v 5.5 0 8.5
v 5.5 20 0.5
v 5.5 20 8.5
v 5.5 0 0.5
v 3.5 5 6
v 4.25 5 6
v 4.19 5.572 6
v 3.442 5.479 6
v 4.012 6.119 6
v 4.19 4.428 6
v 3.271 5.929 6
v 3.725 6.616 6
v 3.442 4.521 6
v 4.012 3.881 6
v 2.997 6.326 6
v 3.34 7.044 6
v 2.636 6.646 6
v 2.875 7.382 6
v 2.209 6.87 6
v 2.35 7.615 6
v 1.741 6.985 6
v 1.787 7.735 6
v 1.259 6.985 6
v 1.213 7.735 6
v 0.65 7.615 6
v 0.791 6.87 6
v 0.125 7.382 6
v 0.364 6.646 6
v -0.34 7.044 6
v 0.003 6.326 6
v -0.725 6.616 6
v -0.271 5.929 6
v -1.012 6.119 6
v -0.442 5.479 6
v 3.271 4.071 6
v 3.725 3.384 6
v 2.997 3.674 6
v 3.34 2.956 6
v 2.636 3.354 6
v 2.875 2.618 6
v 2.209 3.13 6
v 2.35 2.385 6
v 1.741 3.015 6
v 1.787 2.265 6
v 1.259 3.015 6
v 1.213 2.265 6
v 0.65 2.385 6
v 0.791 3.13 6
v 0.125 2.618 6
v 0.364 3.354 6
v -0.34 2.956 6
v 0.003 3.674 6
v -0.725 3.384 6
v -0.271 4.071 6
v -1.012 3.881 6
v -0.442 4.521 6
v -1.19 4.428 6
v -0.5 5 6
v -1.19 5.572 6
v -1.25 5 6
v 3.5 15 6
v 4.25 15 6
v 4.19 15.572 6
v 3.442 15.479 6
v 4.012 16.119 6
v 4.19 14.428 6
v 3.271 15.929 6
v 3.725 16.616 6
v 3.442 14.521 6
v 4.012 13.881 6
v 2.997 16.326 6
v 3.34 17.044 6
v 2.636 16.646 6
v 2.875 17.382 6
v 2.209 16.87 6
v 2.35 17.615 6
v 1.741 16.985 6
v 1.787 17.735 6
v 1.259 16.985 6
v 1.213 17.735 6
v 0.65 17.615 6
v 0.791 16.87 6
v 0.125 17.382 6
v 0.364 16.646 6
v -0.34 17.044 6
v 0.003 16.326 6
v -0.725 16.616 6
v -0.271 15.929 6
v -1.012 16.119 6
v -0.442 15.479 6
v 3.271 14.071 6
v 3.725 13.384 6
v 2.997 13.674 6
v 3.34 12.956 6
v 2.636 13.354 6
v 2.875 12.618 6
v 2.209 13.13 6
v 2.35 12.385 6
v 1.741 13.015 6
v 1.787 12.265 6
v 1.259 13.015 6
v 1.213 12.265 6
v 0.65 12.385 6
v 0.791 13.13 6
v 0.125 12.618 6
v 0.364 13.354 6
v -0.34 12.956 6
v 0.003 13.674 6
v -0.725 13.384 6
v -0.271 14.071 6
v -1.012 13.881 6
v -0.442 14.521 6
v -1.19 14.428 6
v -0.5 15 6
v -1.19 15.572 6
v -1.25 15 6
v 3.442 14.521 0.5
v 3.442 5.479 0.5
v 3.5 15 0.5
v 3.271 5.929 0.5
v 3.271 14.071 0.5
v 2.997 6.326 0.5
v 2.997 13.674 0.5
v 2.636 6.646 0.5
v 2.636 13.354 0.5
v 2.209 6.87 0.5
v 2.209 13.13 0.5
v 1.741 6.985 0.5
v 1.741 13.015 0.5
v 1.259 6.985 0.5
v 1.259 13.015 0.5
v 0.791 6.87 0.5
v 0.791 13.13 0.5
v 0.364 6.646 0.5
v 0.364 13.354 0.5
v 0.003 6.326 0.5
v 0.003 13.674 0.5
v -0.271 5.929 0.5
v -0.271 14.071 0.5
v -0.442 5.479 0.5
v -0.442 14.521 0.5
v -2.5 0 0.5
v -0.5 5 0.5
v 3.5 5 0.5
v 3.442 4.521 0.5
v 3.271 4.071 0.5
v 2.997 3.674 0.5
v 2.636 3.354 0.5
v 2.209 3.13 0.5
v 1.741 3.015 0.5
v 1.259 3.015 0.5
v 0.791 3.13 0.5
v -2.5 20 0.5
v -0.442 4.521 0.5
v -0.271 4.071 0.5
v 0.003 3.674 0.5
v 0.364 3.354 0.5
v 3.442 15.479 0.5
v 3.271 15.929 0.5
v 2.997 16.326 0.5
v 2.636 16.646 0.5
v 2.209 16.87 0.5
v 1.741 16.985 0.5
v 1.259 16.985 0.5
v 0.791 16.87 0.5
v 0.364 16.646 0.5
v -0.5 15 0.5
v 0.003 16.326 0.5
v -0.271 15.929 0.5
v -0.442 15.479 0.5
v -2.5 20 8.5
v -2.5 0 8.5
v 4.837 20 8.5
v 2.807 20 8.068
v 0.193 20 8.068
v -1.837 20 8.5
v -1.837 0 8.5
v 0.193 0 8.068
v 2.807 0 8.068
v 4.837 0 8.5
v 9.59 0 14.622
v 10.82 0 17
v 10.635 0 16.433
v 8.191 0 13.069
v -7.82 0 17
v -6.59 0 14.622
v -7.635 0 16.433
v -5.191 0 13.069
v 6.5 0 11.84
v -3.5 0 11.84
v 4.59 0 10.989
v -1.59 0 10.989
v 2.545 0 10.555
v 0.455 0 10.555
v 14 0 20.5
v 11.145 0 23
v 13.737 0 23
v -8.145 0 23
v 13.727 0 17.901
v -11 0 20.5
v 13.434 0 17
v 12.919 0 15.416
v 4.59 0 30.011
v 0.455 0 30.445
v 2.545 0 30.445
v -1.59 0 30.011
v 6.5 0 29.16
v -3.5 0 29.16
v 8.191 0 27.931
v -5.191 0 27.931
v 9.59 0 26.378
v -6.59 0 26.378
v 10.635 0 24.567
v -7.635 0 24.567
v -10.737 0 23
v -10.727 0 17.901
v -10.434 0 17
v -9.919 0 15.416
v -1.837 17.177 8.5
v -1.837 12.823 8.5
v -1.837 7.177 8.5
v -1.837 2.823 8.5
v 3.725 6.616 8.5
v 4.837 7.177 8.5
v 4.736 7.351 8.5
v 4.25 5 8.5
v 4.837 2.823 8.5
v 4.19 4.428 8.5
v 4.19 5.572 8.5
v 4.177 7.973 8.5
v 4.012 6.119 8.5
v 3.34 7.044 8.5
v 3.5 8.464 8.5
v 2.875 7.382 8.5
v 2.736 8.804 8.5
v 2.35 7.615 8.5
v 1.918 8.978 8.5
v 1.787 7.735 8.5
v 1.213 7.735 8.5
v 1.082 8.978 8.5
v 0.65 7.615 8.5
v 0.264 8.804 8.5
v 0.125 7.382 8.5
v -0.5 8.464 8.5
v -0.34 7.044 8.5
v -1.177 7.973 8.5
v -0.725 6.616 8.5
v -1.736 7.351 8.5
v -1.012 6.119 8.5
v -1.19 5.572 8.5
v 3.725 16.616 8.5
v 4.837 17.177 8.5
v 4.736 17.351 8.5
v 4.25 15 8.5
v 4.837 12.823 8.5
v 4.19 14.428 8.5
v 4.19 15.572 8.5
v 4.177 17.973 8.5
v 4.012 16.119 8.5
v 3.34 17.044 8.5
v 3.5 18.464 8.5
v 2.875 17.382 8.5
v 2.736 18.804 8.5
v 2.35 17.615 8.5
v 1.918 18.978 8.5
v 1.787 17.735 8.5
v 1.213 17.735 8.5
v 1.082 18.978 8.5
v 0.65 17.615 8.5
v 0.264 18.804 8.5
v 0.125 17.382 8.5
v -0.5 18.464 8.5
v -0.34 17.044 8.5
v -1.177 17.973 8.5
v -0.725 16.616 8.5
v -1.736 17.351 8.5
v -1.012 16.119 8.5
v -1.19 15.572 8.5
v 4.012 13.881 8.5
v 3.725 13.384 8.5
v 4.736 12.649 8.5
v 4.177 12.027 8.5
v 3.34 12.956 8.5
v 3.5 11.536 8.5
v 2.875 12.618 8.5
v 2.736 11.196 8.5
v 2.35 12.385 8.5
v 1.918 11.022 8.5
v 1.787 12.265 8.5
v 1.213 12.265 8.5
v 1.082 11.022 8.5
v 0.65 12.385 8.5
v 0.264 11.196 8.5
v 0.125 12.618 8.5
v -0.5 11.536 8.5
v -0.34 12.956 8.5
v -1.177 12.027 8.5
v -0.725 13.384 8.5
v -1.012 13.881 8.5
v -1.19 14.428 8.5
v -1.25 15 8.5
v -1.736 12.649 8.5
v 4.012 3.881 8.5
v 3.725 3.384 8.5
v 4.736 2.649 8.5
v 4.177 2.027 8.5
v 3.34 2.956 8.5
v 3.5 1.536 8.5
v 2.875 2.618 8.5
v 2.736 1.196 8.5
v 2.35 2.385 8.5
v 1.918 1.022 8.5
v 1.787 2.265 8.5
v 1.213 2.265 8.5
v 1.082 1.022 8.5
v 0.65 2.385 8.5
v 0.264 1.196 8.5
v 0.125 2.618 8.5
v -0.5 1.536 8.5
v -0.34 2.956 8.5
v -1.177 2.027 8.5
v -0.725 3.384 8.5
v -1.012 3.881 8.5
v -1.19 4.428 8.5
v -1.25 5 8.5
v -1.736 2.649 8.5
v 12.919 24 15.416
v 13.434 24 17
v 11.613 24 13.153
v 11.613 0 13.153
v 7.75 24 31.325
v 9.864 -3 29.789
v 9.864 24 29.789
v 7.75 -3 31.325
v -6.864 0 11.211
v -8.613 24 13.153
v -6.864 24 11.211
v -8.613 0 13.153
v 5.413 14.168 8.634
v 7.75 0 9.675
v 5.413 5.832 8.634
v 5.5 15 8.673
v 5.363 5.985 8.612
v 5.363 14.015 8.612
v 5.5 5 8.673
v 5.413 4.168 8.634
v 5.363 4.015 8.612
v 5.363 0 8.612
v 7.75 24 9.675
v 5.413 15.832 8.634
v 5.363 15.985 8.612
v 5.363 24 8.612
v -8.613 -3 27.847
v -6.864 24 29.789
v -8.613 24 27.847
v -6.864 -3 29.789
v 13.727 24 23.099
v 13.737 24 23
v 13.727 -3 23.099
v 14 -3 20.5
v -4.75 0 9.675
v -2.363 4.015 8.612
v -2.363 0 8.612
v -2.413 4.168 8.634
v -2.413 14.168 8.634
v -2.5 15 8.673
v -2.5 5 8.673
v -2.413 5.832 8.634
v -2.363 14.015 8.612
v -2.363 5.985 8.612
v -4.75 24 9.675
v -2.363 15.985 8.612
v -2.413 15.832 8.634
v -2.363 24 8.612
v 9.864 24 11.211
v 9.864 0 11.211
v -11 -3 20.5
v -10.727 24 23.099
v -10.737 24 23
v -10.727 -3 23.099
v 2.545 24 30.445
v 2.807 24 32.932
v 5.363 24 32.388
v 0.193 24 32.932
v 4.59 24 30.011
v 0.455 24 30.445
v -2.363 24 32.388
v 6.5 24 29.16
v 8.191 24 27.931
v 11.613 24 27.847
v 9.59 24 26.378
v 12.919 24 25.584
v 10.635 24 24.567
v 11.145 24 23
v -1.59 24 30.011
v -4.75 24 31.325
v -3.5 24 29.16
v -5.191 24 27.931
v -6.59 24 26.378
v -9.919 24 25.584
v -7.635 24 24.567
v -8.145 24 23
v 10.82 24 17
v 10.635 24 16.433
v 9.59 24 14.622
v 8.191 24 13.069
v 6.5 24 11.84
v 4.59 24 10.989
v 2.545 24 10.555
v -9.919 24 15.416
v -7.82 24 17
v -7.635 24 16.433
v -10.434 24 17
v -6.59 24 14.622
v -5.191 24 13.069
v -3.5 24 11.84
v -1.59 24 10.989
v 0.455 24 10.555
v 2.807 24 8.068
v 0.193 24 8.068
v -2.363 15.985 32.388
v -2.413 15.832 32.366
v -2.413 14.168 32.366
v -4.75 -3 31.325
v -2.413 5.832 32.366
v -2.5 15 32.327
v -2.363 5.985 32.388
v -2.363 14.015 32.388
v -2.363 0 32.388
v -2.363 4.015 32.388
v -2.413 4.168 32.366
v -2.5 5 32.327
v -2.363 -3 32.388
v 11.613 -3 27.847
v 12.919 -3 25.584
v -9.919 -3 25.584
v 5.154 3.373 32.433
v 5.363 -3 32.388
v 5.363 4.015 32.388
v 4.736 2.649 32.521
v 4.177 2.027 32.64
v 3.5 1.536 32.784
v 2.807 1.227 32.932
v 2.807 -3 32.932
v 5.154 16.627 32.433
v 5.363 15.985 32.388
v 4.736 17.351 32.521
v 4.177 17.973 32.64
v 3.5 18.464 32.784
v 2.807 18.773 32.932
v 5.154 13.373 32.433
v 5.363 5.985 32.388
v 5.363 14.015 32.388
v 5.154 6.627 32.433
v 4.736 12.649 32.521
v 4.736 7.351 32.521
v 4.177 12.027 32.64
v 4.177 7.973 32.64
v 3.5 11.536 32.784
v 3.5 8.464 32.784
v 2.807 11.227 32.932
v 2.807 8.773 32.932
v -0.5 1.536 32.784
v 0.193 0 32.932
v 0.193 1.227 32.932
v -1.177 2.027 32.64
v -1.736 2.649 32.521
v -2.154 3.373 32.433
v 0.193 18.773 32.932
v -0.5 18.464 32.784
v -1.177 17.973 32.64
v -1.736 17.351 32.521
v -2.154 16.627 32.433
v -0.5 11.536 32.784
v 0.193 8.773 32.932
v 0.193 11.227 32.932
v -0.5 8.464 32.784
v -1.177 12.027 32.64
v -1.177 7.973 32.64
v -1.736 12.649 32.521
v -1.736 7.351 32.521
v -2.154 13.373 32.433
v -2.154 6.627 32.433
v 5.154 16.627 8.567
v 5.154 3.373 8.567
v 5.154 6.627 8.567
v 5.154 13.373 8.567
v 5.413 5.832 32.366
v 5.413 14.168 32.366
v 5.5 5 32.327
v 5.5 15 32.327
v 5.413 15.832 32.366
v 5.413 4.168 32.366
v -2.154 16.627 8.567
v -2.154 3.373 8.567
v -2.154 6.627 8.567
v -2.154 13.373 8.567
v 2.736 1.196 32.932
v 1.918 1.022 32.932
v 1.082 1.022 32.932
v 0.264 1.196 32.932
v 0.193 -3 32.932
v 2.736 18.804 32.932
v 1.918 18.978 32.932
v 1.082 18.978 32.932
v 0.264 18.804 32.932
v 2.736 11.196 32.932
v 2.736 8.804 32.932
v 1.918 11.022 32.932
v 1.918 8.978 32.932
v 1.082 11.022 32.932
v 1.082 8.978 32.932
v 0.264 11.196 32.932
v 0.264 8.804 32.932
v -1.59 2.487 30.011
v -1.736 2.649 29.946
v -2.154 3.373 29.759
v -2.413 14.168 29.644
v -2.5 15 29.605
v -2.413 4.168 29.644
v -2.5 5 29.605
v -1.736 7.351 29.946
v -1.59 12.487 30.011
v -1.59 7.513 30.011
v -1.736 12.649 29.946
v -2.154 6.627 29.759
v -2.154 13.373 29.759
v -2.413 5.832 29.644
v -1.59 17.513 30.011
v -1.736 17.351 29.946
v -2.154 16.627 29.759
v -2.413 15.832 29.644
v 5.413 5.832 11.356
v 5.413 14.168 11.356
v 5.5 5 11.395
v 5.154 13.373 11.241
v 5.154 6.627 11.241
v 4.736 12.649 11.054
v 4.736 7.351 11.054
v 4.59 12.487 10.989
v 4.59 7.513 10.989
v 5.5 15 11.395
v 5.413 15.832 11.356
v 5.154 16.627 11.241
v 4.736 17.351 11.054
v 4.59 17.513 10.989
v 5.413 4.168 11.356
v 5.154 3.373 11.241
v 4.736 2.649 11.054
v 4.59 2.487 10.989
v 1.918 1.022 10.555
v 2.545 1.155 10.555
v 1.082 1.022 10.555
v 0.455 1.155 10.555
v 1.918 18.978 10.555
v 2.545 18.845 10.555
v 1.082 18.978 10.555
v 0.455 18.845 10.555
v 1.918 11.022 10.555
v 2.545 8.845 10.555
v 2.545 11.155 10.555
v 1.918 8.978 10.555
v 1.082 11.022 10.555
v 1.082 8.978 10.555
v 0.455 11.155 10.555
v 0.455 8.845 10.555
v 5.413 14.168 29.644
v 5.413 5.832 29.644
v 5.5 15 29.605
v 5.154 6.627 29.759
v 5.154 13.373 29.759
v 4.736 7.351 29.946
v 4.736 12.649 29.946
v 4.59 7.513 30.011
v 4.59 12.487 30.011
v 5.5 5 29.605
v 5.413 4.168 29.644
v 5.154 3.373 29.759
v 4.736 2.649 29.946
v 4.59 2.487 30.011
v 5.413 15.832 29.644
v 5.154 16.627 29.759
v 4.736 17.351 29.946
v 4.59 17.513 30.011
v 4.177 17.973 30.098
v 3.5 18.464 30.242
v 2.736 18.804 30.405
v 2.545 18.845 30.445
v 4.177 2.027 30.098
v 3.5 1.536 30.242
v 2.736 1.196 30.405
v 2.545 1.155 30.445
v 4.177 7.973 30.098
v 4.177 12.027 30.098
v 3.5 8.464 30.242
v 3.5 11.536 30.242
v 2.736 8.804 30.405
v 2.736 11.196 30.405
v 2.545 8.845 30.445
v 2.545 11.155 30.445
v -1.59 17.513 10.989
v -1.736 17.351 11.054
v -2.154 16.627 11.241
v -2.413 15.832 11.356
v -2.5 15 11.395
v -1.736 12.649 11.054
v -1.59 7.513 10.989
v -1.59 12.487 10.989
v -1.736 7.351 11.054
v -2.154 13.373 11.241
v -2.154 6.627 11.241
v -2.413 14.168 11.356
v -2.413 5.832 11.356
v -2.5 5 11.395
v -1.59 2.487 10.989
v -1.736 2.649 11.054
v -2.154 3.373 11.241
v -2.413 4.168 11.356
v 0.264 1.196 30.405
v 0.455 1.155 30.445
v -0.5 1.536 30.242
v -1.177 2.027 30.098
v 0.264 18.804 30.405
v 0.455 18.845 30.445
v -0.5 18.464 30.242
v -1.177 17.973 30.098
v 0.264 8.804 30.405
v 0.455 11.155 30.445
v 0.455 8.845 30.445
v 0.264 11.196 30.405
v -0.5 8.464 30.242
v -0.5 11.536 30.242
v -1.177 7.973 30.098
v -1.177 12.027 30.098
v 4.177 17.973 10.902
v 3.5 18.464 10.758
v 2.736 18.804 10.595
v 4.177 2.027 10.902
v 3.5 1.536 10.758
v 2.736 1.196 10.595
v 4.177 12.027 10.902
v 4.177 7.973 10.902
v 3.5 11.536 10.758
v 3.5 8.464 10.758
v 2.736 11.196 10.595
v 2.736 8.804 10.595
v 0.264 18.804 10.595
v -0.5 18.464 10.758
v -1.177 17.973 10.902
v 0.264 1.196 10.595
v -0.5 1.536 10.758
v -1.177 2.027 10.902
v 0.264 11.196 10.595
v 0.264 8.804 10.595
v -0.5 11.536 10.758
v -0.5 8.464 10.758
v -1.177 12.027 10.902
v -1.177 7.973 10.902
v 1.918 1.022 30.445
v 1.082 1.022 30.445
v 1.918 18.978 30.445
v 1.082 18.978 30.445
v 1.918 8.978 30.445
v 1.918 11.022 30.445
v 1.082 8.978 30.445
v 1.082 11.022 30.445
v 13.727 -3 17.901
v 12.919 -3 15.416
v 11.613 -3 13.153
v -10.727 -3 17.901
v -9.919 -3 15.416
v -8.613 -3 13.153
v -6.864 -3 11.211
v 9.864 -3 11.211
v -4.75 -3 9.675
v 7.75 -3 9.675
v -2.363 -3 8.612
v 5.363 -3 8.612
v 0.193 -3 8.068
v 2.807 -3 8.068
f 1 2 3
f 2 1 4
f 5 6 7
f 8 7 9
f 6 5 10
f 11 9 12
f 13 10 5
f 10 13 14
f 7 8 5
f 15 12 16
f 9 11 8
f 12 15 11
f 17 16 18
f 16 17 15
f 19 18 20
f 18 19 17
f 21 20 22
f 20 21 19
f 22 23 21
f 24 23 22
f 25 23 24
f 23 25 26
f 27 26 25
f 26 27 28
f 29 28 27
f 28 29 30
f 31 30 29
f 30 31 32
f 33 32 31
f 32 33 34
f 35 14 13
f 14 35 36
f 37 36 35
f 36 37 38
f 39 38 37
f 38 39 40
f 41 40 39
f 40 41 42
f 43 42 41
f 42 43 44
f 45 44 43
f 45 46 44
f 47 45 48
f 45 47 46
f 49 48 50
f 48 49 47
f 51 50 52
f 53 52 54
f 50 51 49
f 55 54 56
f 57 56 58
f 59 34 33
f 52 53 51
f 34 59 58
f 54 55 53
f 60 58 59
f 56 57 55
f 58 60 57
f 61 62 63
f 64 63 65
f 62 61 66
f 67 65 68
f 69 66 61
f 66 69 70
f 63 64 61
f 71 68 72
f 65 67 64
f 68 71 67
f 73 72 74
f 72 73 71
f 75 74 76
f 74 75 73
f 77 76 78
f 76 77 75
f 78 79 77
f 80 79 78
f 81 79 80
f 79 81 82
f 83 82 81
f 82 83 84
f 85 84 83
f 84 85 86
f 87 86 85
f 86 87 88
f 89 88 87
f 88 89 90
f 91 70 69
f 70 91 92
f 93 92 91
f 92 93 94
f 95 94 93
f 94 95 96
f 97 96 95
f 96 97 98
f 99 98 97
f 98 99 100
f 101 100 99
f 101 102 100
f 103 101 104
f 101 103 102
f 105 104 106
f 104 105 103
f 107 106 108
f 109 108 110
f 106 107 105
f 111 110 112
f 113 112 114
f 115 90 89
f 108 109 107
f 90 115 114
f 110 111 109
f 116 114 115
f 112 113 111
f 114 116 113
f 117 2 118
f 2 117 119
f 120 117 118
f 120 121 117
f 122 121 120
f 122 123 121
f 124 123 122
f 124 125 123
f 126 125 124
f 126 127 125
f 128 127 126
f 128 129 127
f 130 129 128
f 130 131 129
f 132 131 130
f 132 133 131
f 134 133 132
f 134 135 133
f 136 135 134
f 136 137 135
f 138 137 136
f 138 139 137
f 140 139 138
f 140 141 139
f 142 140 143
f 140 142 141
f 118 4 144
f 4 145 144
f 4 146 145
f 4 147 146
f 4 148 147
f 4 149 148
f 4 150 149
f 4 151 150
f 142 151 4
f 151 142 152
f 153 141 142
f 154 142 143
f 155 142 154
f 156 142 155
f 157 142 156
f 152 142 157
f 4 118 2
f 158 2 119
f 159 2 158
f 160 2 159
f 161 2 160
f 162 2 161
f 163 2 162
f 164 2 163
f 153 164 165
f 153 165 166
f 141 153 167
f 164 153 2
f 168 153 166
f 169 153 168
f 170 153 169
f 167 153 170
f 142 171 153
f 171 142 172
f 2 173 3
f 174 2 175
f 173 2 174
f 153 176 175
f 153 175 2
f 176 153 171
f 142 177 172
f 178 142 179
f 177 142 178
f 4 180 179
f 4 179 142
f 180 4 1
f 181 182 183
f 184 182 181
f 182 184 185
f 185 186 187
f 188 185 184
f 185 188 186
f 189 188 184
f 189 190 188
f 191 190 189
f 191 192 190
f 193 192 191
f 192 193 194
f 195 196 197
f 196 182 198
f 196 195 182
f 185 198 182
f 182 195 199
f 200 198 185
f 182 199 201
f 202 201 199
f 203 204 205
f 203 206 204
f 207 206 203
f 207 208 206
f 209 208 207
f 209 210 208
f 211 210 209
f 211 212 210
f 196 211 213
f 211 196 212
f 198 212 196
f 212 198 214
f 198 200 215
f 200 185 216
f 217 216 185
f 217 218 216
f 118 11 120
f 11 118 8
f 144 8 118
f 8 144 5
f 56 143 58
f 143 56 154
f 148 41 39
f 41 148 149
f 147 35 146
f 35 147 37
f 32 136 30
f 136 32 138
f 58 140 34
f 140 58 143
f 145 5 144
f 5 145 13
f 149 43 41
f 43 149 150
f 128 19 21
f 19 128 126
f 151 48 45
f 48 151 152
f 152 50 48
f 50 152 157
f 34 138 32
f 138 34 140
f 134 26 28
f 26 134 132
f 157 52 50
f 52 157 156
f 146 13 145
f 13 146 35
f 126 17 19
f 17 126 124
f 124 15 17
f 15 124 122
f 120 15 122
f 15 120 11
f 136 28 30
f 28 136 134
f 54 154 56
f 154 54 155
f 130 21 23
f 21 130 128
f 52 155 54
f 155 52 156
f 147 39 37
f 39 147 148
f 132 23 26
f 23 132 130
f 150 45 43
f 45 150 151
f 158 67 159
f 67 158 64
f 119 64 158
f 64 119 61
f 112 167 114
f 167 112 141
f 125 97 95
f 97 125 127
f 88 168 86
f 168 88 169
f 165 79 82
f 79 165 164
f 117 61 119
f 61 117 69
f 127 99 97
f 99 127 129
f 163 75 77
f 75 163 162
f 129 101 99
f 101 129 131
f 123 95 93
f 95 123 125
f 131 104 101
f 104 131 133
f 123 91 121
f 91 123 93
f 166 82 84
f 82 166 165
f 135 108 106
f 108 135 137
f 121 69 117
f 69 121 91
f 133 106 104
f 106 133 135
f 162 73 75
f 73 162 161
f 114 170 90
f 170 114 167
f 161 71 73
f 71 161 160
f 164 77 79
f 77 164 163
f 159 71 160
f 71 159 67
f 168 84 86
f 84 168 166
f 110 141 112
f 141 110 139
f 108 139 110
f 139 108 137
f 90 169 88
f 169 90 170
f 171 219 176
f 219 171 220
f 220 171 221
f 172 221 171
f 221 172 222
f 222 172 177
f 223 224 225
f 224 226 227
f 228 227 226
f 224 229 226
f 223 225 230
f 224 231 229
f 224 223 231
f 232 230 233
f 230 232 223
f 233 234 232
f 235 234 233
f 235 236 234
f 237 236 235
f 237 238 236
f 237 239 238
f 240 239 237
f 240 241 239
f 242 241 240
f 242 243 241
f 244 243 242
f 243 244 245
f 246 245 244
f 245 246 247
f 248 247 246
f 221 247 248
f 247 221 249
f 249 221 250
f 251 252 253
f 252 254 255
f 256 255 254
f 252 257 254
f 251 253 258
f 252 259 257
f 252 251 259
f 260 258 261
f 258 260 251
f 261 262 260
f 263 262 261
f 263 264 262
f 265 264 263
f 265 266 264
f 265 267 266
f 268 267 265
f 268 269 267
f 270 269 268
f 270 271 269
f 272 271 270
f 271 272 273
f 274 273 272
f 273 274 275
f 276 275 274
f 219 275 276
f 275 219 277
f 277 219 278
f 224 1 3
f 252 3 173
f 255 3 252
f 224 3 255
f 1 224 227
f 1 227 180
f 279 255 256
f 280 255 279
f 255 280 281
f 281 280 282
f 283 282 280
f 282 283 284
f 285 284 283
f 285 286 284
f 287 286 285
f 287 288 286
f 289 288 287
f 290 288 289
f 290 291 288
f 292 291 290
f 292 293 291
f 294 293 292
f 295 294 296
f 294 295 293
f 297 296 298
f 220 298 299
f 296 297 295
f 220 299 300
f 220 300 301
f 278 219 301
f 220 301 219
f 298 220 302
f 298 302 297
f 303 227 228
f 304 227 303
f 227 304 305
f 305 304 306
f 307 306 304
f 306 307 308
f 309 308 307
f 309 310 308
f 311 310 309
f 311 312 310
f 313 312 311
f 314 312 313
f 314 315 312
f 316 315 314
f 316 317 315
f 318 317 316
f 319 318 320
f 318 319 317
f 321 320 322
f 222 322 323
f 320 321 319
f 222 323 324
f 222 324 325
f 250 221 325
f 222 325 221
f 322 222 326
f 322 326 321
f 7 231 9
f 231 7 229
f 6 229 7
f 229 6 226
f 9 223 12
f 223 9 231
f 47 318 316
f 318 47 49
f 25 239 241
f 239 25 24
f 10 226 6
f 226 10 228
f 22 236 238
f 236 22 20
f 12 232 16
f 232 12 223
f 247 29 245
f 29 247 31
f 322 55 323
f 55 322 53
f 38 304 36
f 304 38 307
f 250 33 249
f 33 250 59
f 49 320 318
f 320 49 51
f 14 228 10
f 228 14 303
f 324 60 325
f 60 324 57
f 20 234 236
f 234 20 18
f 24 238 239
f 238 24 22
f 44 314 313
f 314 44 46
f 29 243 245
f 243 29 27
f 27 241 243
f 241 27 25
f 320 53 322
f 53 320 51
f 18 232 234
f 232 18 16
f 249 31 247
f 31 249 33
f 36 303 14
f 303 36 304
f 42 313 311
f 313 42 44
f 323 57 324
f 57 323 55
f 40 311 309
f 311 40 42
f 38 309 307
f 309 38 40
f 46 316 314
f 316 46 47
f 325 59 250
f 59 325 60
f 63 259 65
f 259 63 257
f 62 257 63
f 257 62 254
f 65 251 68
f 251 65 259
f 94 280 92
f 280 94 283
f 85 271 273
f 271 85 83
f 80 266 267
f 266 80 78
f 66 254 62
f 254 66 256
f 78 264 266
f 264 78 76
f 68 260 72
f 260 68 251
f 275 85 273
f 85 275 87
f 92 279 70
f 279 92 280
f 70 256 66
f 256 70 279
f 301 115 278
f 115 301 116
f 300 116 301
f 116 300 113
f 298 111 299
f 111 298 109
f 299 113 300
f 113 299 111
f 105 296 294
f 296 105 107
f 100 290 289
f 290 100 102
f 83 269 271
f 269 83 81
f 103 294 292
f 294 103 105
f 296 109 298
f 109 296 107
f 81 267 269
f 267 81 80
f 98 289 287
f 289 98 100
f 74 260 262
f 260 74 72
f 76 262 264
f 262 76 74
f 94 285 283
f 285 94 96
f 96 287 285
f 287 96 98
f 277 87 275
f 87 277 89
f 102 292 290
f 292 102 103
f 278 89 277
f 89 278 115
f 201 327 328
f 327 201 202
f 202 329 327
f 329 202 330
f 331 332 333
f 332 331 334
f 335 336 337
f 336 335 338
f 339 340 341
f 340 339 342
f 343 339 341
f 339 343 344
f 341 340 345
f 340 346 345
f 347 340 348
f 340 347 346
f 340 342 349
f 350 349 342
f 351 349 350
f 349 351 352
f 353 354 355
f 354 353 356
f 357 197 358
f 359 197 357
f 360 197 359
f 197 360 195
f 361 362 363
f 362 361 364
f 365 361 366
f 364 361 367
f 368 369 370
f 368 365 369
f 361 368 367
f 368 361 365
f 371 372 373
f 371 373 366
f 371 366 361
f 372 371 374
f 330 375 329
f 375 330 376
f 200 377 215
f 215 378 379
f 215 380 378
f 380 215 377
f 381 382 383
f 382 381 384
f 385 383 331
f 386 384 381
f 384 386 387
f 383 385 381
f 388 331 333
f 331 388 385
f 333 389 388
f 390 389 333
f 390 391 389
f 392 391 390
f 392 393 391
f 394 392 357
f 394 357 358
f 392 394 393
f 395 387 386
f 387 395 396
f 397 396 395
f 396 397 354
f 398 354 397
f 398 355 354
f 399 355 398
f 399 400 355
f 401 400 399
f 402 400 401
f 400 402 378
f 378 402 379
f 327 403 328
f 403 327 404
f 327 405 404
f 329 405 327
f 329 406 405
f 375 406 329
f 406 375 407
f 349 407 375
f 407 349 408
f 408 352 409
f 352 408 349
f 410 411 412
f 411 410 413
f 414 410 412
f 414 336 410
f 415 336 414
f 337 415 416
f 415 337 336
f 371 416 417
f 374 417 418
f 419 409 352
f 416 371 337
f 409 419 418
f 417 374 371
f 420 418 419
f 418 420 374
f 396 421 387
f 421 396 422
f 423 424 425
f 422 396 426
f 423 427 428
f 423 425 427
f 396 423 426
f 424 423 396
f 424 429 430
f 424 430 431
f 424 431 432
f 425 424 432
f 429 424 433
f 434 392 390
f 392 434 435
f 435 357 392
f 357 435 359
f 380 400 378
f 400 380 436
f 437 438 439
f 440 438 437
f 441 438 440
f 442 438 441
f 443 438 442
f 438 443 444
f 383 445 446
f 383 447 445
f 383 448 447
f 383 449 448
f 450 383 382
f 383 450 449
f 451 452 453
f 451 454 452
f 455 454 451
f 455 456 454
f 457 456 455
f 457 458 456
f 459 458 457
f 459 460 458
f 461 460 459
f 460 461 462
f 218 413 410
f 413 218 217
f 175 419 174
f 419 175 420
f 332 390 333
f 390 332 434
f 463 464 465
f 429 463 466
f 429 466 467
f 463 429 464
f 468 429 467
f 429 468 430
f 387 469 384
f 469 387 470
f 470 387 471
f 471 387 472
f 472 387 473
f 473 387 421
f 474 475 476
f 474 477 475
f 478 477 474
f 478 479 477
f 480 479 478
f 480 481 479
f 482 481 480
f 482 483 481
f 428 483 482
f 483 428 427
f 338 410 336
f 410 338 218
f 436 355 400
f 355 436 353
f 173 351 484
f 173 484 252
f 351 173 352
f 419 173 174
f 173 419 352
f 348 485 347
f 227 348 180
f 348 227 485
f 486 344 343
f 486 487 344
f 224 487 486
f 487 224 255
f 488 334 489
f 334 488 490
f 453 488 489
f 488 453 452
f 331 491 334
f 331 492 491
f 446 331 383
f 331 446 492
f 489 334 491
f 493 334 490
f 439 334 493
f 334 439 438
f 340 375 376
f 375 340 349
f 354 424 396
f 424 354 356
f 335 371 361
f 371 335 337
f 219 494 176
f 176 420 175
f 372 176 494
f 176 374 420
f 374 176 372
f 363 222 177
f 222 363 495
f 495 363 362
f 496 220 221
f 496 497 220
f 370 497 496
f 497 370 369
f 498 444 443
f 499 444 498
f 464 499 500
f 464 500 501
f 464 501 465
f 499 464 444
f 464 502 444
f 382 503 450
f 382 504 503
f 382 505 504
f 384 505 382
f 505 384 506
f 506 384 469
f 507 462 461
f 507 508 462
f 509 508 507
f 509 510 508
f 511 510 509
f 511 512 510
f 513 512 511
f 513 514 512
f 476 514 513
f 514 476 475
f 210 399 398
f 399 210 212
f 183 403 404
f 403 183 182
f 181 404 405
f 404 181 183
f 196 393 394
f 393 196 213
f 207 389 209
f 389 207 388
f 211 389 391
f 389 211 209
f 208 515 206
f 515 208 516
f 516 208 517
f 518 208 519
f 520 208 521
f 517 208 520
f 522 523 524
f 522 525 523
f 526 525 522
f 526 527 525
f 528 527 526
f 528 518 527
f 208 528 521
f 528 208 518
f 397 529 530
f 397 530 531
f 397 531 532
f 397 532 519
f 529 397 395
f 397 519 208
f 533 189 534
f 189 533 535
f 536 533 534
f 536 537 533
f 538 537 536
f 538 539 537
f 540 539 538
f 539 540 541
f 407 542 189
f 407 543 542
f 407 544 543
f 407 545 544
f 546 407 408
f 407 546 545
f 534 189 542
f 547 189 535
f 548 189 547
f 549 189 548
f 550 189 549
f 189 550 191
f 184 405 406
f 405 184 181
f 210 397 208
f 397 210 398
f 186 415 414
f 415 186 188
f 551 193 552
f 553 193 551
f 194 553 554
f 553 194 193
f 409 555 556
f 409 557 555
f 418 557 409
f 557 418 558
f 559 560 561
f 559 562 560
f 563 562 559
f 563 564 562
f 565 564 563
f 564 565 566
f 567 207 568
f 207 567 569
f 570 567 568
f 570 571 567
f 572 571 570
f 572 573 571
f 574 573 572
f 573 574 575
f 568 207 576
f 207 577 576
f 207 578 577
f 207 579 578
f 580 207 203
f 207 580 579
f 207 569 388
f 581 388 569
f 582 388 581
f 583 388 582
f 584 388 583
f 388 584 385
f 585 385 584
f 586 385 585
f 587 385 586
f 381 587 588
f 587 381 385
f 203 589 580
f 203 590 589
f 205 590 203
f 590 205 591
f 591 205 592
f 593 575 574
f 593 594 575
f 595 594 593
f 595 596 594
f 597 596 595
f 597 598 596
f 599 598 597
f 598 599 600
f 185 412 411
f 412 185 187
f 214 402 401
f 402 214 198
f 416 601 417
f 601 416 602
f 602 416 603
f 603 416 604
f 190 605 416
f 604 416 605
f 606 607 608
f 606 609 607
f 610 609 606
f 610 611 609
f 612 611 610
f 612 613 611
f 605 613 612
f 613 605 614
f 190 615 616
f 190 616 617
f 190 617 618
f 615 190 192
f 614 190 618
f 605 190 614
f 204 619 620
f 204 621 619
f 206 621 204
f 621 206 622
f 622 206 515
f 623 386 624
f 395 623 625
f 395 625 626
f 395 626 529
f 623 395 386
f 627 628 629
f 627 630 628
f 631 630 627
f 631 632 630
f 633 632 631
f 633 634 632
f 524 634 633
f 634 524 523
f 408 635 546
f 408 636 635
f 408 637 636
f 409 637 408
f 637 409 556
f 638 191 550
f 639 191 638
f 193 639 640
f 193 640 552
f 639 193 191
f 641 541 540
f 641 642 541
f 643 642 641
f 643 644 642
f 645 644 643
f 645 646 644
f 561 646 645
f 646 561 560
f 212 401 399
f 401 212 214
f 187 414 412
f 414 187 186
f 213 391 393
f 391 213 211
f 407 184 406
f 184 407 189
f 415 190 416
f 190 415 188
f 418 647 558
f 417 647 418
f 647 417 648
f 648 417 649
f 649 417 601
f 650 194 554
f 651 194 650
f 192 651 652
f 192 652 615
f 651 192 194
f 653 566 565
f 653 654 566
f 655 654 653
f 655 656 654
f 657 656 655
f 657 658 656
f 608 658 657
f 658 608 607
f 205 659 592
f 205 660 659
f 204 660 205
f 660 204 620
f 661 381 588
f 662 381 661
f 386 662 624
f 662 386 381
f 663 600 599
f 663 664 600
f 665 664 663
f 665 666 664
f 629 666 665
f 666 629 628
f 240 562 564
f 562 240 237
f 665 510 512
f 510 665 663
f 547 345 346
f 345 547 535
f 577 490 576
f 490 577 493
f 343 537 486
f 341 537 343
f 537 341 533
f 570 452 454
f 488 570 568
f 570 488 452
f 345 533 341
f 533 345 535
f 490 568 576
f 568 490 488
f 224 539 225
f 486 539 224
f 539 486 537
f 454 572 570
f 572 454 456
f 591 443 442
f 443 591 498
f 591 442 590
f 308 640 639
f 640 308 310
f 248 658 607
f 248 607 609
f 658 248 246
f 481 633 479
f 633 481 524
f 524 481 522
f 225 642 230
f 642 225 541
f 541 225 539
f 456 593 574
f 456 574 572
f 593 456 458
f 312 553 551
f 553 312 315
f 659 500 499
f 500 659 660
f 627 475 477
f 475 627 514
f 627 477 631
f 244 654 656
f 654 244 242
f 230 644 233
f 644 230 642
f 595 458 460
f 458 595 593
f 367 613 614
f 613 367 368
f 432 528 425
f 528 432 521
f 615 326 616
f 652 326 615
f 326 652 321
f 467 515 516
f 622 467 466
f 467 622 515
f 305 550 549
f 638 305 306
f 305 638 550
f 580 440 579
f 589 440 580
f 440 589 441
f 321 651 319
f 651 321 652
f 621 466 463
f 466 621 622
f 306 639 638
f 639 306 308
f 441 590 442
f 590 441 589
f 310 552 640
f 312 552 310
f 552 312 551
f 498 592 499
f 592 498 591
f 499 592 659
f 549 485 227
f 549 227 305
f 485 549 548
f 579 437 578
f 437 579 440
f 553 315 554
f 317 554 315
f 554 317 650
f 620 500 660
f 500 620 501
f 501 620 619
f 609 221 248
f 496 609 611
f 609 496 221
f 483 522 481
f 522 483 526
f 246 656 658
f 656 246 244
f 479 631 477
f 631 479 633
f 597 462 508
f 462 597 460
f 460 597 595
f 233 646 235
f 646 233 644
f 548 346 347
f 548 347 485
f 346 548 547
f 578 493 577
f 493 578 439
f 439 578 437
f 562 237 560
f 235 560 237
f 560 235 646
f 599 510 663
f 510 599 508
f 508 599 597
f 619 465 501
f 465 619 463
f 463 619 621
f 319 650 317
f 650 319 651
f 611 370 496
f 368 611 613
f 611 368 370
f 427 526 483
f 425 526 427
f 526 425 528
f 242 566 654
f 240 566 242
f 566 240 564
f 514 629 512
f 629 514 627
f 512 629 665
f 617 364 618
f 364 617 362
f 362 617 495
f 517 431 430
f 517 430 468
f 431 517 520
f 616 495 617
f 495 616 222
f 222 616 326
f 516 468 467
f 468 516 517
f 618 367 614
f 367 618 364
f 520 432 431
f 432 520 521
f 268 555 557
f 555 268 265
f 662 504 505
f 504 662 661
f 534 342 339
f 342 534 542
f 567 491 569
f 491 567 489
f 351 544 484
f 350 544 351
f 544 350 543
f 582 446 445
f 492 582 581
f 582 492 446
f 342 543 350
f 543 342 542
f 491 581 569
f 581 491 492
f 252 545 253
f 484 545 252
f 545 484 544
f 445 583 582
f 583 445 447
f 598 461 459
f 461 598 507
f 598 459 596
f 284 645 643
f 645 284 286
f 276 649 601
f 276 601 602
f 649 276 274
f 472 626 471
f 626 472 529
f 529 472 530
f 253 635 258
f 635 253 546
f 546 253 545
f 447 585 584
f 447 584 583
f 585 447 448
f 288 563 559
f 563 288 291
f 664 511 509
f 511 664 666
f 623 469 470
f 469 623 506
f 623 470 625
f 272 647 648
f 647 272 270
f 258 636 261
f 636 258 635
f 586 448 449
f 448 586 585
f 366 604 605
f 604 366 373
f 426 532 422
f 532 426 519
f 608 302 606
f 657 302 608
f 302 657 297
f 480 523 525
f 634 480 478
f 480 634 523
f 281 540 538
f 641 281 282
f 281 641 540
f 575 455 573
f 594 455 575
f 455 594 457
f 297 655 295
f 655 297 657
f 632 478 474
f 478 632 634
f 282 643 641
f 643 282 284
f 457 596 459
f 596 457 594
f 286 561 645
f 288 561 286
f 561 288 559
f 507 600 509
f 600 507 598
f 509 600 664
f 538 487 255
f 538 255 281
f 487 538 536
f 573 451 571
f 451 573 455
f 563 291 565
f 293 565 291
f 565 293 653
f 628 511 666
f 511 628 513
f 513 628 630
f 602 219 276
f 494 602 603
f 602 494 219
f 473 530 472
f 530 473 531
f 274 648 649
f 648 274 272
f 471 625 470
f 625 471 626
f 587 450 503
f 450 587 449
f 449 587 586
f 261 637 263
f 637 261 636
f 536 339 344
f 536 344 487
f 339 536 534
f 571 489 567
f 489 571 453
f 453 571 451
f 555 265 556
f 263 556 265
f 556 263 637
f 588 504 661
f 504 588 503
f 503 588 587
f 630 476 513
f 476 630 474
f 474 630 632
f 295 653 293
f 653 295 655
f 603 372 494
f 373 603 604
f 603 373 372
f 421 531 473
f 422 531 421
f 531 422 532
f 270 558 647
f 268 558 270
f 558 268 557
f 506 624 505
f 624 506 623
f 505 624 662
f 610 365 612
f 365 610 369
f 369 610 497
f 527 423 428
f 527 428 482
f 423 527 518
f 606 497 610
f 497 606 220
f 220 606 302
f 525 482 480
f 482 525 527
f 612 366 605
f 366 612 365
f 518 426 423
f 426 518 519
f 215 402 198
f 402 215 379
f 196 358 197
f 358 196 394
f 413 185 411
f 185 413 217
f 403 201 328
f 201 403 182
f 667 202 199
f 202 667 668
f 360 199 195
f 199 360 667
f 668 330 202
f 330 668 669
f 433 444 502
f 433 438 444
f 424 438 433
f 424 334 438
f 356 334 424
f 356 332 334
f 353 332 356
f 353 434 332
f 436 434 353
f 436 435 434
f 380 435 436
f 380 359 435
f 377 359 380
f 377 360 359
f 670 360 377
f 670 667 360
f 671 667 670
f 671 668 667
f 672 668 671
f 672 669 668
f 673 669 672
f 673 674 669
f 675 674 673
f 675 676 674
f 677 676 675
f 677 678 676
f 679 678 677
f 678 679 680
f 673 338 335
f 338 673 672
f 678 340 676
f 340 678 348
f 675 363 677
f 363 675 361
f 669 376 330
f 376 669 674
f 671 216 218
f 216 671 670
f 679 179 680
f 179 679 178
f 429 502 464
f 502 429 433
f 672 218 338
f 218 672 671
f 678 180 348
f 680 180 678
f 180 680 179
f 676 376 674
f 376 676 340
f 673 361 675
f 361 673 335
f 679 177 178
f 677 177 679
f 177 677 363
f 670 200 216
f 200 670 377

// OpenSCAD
union(){
    $fs = 0.5;
    difference(){
        translate([-2.5,0,0.5])
            cube([8,20,5.5]);
        translate([1.5,5,0.5])    
            cylinder(h=5.5, d=4);
        translate([1.5,15,0.5])    
            cylinder(h=5.5, d=4);
    }
    difference(){
        translate([-2.5,0,5.5])
            cube([8,20,3]);
        translate([1.5,5,5.5])
            cylinder(h=3, d=5.5);
        translate([1.5,15,5.5])
            cylinder(h=3, d=5.5);
    }
    translate([1.5,-3,20.5])
        rotate([270,0,0])
        cylinder(h=3, d=25);
   
    difference(){
        translate([1.5,0,20.5])
            rotate([270,0,0])
            difference(){
                cylinder(h=24, d=25);
                cylinder(h=24, d=20);
            }
        translate([1.5,5,7])
            rotate([0,0,0])
            cylinder(h=30, d=8);  
        translate([1.5,15,7])
            rotate([0,0,0])
            cylinder(h=30, d=8);
    
        translate([14.5,0,17])
            rotate([0,0,90])
            cube([26,26,6]);
    }     

}
